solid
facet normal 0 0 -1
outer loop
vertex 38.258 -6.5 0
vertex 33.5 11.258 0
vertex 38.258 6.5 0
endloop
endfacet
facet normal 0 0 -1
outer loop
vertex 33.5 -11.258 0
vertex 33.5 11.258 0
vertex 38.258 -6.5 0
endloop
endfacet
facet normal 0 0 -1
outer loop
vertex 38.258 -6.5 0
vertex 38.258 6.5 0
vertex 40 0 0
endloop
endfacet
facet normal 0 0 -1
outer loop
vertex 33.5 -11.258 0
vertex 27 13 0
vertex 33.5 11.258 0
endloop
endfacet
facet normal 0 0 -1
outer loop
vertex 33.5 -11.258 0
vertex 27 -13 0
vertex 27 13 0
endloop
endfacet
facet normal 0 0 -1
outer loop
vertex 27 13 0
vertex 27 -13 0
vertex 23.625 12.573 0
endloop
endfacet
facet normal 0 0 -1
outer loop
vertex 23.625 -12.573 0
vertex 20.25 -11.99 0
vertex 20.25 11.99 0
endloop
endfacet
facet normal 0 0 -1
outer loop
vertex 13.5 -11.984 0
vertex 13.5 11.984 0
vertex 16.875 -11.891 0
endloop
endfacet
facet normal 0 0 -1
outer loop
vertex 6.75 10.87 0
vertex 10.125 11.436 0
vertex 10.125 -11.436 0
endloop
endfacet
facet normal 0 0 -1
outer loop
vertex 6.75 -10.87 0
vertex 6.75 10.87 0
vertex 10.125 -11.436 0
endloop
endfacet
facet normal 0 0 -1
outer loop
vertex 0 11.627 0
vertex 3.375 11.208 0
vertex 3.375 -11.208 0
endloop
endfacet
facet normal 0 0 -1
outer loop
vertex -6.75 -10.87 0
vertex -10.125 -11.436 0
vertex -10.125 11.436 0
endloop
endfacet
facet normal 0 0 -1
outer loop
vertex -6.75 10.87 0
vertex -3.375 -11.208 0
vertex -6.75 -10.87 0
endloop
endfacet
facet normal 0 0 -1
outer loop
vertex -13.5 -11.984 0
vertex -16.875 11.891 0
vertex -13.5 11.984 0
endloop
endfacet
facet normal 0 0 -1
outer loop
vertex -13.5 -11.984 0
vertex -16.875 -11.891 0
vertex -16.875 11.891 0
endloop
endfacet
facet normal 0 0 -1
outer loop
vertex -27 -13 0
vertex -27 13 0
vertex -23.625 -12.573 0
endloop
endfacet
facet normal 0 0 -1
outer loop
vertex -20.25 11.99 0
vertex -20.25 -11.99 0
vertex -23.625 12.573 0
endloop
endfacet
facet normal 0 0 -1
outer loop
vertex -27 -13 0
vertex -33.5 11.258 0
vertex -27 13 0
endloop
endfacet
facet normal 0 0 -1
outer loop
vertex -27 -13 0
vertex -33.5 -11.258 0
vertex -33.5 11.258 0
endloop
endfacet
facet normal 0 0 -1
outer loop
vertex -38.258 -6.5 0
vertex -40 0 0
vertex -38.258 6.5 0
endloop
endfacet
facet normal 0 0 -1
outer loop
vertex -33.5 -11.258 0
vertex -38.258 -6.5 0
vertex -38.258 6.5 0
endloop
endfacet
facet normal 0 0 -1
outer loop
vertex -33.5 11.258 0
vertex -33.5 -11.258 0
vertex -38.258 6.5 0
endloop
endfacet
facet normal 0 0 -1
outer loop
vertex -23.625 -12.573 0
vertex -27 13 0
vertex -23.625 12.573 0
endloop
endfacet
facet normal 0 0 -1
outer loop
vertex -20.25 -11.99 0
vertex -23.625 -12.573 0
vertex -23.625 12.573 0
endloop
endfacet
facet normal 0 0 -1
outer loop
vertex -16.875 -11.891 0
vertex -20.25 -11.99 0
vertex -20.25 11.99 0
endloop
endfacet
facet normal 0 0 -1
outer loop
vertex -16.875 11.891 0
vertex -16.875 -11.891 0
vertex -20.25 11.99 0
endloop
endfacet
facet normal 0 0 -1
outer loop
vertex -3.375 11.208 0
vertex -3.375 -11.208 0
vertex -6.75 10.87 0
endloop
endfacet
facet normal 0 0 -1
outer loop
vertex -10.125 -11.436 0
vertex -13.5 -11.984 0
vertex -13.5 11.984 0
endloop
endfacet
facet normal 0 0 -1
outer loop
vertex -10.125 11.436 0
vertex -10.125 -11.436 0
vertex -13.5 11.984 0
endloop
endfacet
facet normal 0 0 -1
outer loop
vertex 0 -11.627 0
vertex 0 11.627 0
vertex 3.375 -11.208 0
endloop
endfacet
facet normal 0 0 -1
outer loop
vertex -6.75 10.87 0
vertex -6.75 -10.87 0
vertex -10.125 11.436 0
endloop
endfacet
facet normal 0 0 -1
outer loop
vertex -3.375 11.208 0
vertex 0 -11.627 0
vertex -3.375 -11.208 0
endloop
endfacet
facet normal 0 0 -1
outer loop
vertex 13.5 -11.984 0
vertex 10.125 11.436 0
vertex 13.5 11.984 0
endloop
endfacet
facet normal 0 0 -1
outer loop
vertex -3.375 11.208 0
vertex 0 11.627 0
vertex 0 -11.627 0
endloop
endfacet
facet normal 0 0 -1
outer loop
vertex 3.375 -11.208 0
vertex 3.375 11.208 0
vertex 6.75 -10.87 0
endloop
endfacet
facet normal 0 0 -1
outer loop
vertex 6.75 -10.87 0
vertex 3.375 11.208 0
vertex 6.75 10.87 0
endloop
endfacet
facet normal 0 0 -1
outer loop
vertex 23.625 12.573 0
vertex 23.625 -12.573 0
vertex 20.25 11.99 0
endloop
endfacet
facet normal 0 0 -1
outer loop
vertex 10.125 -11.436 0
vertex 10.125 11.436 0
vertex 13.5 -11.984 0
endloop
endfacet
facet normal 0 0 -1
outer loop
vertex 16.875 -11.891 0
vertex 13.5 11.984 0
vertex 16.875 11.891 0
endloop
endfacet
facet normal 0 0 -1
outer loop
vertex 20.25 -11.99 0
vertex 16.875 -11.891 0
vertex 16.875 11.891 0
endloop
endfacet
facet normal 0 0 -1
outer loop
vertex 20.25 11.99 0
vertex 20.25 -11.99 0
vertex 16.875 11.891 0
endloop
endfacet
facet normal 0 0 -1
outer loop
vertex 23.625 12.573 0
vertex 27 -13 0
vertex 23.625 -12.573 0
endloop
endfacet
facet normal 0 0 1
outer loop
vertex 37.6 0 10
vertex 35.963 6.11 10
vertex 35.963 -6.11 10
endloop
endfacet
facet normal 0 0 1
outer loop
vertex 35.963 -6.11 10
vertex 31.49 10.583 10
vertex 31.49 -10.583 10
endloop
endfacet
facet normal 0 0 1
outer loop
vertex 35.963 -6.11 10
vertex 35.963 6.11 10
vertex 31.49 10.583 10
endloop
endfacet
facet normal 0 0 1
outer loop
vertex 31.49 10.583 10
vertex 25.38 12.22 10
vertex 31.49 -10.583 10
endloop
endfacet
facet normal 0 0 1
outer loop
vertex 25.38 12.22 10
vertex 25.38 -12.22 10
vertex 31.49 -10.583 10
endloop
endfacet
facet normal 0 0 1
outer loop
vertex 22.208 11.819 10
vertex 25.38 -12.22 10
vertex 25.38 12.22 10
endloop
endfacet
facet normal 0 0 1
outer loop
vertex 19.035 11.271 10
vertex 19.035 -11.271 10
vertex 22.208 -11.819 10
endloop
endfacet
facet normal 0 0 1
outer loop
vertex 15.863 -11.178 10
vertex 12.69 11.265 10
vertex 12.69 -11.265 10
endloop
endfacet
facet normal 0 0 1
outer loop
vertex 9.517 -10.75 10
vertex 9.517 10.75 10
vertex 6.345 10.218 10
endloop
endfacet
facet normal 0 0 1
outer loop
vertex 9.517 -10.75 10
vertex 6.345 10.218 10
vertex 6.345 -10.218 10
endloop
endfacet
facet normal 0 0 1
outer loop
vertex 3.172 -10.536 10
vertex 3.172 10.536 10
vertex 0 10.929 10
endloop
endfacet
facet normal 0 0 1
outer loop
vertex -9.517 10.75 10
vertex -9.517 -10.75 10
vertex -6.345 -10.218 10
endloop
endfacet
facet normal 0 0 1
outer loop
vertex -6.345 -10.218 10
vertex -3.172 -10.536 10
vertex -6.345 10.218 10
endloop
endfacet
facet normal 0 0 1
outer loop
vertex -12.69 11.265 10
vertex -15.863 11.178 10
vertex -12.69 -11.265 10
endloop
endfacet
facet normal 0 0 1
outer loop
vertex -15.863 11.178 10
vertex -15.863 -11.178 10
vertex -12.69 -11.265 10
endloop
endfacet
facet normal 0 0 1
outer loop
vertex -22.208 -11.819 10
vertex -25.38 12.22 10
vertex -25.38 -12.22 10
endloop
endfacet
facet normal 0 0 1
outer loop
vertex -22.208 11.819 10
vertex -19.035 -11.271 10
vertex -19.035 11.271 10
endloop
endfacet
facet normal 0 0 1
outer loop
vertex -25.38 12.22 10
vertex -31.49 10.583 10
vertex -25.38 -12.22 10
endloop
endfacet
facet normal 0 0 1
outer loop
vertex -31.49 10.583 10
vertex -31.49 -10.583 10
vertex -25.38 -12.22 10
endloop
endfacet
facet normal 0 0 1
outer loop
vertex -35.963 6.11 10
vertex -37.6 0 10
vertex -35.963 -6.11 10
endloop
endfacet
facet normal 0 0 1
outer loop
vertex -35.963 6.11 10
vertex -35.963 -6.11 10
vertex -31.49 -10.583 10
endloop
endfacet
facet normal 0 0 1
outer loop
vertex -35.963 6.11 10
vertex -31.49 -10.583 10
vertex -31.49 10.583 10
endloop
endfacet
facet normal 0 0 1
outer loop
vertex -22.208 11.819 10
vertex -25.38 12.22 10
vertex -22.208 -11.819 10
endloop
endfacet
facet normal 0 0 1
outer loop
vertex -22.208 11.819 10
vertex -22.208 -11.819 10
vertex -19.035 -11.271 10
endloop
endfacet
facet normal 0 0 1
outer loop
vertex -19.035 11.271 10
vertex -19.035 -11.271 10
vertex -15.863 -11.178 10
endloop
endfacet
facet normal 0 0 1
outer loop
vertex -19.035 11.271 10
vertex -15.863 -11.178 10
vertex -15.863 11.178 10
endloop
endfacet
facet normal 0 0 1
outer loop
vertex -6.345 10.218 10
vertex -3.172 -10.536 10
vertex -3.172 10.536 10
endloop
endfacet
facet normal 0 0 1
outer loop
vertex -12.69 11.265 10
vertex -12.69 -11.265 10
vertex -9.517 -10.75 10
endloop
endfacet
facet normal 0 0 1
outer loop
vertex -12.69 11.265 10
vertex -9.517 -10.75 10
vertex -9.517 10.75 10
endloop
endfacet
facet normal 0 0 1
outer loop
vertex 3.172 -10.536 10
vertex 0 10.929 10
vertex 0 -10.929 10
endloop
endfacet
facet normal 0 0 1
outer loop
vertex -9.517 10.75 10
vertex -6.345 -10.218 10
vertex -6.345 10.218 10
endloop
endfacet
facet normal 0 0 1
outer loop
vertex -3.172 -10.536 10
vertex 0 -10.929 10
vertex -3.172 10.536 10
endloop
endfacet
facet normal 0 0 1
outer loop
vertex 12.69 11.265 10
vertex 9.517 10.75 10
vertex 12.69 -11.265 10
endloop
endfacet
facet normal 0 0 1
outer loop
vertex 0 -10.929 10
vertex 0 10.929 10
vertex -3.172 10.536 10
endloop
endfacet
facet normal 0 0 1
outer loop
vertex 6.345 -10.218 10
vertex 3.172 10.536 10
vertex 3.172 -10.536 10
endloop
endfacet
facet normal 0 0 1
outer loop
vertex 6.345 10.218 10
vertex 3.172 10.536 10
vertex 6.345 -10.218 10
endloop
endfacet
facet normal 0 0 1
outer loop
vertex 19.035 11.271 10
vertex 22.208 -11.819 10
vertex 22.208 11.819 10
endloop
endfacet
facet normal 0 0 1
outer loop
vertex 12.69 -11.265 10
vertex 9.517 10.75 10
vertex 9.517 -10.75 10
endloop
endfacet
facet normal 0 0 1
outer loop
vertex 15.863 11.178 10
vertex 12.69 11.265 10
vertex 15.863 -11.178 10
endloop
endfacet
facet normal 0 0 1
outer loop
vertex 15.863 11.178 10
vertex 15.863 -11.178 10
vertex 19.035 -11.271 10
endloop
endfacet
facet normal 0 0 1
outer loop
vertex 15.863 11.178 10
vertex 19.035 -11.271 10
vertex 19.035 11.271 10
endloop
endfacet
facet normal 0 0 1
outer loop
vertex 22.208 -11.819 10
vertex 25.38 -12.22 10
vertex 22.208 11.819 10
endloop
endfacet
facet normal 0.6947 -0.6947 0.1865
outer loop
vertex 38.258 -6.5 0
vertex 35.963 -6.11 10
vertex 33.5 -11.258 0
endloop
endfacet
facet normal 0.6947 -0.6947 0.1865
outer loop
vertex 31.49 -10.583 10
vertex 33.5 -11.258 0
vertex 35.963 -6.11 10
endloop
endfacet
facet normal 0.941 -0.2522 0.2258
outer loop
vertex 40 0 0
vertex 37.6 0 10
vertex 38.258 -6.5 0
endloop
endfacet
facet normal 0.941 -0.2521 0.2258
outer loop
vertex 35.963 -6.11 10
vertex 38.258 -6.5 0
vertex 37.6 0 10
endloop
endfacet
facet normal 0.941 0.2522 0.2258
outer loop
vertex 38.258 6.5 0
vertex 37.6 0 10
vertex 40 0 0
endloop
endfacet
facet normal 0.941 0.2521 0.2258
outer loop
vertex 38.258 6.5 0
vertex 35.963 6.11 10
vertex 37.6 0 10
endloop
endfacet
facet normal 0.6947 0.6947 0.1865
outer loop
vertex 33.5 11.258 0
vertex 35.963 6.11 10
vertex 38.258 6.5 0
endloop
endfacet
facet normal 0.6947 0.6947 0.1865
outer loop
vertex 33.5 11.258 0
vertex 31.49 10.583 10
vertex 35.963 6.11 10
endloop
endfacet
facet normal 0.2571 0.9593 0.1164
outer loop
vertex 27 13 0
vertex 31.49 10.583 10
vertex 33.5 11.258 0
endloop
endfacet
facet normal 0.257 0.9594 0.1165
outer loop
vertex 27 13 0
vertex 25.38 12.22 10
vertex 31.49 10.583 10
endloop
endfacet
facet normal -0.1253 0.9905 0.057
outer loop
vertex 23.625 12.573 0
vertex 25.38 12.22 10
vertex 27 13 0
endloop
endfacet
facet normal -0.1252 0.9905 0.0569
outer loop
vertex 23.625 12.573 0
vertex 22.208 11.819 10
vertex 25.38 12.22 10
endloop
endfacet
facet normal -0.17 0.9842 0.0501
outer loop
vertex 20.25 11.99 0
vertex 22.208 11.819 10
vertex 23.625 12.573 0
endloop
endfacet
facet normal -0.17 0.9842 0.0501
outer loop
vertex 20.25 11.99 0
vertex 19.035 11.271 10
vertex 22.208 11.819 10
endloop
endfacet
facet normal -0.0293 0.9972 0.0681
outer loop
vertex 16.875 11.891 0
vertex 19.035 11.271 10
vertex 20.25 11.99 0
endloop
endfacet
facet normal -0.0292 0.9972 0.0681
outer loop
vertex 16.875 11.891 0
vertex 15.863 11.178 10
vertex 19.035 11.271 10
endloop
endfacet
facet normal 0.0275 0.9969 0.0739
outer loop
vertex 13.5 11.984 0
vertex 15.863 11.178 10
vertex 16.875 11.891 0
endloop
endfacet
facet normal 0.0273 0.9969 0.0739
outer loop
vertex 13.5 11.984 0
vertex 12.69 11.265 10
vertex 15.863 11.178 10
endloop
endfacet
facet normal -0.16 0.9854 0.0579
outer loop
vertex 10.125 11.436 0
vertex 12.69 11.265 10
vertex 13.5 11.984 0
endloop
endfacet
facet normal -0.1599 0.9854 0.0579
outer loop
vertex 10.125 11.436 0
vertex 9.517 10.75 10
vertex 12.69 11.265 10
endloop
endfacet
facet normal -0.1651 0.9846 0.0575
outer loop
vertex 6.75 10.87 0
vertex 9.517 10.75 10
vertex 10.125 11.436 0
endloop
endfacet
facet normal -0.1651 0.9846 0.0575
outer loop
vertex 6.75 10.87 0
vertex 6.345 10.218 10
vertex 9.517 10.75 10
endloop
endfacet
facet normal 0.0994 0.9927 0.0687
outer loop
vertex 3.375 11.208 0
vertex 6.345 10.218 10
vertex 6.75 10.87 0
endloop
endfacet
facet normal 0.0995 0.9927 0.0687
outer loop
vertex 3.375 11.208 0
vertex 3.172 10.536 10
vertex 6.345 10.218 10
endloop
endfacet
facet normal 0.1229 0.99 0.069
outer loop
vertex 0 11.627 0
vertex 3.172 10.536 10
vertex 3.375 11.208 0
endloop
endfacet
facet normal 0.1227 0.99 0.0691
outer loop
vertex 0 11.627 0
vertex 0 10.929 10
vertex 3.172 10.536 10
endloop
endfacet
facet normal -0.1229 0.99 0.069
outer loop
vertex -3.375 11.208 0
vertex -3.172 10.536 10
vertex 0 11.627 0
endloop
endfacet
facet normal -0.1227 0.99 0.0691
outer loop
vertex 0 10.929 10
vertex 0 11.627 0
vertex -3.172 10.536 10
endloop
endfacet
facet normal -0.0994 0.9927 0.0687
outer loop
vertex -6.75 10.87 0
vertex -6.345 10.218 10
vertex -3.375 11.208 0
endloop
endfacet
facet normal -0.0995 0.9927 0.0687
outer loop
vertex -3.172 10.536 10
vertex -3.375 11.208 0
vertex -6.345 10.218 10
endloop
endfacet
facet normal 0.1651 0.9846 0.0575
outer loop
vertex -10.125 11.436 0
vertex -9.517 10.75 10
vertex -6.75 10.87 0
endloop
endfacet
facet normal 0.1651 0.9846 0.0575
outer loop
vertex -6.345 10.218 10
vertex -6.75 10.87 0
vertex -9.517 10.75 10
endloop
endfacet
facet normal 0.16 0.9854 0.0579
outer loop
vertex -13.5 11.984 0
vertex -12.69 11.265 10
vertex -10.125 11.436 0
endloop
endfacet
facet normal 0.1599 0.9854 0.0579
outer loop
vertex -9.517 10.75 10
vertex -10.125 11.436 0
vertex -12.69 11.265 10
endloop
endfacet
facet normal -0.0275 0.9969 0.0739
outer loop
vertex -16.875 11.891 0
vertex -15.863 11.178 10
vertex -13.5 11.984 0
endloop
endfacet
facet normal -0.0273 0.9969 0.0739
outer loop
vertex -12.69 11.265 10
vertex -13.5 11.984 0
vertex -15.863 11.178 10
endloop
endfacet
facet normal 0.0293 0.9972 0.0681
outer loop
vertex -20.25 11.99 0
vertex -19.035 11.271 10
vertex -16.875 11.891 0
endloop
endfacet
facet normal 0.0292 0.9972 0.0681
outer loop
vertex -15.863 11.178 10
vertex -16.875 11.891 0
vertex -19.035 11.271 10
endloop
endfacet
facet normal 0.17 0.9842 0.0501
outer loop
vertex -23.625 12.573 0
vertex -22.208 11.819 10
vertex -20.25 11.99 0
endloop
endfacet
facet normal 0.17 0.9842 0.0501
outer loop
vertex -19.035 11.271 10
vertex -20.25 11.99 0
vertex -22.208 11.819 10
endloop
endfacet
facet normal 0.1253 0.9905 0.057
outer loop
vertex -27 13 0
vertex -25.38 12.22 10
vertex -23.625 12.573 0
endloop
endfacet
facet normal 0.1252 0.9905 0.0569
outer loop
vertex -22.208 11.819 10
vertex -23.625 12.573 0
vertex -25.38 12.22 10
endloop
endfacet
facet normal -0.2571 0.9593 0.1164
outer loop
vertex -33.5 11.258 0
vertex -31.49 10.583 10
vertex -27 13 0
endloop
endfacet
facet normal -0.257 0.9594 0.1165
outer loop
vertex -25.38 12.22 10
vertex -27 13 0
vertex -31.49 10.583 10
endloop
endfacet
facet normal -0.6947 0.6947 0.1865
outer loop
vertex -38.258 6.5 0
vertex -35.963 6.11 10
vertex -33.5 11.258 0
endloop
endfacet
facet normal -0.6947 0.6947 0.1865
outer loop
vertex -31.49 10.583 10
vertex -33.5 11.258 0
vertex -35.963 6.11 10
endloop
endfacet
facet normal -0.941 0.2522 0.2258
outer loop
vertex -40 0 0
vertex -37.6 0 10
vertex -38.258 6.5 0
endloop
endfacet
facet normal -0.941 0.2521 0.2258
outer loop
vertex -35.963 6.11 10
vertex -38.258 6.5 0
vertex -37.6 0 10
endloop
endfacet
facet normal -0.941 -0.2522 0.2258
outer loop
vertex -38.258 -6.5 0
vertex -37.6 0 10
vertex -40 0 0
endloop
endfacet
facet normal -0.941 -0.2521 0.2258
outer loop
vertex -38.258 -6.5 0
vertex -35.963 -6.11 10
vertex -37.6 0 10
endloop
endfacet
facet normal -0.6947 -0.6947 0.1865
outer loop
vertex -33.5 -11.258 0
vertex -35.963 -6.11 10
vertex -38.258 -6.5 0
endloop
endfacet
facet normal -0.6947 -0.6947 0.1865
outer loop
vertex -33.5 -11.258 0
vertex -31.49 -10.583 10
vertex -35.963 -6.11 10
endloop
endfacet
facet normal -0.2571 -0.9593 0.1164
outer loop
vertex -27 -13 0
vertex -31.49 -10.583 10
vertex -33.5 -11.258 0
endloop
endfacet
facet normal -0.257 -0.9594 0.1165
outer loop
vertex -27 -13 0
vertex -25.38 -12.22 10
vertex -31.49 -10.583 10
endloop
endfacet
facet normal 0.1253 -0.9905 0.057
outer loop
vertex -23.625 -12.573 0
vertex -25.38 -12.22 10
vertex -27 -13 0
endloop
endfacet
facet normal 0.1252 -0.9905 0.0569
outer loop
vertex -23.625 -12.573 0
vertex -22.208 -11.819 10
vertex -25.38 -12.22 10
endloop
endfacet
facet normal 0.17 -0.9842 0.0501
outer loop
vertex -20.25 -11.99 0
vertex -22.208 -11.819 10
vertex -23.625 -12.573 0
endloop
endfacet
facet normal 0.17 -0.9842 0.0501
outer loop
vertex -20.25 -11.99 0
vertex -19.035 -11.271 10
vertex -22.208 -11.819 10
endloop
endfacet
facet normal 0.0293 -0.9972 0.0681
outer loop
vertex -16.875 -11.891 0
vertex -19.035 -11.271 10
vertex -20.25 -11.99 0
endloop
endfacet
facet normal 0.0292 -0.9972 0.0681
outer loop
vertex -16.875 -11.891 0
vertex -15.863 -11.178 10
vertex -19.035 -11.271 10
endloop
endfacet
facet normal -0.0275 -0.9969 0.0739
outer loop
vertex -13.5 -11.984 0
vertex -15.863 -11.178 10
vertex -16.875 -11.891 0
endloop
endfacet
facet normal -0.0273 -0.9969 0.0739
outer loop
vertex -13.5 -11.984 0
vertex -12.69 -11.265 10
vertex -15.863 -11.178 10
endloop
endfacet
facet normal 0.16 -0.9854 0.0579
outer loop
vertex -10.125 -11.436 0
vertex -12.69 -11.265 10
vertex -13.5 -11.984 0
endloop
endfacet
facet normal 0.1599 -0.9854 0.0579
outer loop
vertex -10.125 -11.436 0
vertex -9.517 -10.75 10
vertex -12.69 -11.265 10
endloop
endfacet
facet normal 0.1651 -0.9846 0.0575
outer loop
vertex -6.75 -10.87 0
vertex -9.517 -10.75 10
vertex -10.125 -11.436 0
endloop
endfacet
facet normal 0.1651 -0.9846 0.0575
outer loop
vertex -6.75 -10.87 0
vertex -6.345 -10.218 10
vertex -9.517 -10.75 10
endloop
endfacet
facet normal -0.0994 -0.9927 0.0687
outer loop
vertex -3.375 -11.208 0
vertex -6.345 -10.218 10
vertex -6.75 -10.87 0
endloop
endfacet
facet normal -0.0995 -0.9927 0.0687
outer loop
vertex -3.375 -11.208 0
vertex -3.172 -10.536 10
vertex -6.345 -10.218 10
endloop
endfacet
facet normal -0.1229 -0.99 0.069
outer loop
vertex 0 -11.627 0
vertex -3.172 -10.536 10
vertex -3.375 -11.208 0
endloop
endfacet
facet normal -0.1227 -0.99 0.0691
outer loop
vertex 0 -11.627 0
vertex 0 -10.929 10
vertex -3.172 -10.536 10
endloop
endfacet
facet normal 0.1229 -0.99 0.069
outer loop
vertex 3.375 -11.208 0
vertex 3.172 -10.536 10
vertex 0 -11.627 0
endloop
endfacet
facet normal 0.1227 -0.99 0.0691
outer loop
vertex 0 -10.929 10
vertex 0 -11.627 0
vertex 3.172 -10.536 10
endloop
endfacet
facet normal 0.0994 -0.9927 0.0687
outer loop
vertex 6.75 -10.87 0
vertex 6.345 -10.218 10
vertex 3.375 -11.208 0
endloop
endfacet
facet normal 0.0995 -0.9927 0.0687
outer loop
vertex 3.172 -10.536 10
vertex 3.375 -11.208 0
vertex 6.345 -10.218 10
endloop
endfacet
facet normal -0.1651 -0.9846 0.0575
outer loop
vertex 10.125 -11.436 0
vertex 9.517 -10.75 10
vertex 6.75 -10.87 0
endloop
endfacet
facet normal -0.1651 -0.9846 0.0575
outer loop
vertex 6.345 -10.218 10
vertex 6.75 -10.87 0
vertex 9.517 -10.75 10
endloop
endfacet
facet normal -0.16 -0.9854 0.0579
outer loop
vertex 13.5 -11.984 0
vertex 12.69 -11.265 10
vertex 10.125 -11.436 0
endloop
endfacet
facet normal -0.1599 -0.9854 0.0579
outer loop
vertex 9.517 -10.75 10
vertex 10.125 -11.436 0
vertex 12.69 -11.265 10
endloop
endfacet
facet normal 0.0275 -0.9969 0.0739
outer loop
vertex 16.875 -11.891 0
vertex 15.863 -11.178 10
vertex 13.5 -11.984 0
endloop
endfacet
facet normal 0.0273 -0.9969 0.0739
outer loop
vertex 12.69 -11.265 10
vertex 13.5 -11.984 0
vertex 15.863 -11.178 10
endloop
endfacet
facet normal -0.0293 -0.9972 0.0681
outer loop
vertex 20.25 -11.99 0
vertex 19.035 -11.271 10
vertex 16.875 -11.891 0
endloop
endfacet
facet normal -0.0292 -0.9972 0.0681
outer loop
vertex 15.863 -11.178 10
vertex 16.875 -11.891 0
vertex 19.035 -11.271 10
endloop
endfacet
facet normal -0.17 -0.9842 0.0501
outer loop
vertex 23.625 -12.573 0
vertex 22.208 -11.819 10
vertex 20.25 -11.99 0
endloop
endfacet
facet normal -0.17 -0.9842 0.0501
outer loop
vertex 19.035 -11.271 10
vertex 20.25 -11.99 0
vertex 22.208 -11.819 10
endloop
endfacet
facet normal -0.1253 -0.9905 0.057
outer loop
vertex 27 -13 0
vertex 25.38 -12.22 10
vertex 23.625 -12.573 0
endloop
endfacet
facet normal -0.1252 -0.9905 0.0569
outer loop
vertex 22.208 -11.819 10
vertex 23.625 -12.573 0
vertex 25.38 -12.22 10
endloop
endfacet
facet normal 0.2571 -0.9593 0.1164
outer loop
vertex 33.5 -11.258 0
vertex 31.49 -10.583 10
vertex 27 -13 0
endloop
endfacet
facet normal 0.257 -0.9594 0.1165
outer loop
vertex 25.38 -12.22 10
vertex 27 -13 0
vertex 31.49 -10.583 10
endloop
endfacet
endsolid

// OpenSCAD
$fn = 32;

// ----------------------------------------------------------------------
// Handle: 80 x 26 mm grip, 10 mm thick
// ----------------------------------------------------------------------

// --- parameters (mm) ---
length = 80;              // grip length
width = 26;               // grip width
thickness = 10;           // grip thickness
waist = 0.86;             // width factor at the middle
draft = 0.94;             // top face scale of the extrusion
scallops = 4;             // finger rests per side
ripple = 0.04;            // depth factor of the finger rests

/* ergonomic grip outline, closed spline-like polygon in the XY plane */
grip = [[-27, 13], [-23.625, 12.573], [-20.25, 11.99], [-16.875, 11.891], [-13.5, 11.984], [-10.125, 11.436], [-6.75, 10.87], [-3.375, 11.208], [0, 11.627], [3.375, 11.208], [6.75, 10.87], [10.125, 11.436], [13.5, 11.984], [16.875, 11.891], [20.25, 11.99], [23.625, 12.573], [27, 13], [33.5, 11.258], [38.258, 6.5], [40, 0], [38.258, -6.5], [33.5, -11.258], [27, -13], [27, -13], [23.625, -12.573], [20.25, -11.99], [16.875, -11.891], [13.5, -11.984], [10.125, -11.436], [6.75, -10.87], [3.375, -11.208], [0, -11.627], [-3.375, -11.208], [-6.75, -10.87], [-10.125, -11.436], [-13.5, -11.984], [-16.875, -11.891], [-20.25, -11.99], [-23.625, -12.573], [-27, -13], [-33.5, -11.258], [-38.258, -6.5], [-40, 0], [-38.258, 6.5], [-33.5, 11.258], [-27, 13]];

module grip_body() {
  linear_extrude(height = thickness, scale = draft) polygon(grip);
}

difference() {
  union() {
    grip_body();
  }
}
